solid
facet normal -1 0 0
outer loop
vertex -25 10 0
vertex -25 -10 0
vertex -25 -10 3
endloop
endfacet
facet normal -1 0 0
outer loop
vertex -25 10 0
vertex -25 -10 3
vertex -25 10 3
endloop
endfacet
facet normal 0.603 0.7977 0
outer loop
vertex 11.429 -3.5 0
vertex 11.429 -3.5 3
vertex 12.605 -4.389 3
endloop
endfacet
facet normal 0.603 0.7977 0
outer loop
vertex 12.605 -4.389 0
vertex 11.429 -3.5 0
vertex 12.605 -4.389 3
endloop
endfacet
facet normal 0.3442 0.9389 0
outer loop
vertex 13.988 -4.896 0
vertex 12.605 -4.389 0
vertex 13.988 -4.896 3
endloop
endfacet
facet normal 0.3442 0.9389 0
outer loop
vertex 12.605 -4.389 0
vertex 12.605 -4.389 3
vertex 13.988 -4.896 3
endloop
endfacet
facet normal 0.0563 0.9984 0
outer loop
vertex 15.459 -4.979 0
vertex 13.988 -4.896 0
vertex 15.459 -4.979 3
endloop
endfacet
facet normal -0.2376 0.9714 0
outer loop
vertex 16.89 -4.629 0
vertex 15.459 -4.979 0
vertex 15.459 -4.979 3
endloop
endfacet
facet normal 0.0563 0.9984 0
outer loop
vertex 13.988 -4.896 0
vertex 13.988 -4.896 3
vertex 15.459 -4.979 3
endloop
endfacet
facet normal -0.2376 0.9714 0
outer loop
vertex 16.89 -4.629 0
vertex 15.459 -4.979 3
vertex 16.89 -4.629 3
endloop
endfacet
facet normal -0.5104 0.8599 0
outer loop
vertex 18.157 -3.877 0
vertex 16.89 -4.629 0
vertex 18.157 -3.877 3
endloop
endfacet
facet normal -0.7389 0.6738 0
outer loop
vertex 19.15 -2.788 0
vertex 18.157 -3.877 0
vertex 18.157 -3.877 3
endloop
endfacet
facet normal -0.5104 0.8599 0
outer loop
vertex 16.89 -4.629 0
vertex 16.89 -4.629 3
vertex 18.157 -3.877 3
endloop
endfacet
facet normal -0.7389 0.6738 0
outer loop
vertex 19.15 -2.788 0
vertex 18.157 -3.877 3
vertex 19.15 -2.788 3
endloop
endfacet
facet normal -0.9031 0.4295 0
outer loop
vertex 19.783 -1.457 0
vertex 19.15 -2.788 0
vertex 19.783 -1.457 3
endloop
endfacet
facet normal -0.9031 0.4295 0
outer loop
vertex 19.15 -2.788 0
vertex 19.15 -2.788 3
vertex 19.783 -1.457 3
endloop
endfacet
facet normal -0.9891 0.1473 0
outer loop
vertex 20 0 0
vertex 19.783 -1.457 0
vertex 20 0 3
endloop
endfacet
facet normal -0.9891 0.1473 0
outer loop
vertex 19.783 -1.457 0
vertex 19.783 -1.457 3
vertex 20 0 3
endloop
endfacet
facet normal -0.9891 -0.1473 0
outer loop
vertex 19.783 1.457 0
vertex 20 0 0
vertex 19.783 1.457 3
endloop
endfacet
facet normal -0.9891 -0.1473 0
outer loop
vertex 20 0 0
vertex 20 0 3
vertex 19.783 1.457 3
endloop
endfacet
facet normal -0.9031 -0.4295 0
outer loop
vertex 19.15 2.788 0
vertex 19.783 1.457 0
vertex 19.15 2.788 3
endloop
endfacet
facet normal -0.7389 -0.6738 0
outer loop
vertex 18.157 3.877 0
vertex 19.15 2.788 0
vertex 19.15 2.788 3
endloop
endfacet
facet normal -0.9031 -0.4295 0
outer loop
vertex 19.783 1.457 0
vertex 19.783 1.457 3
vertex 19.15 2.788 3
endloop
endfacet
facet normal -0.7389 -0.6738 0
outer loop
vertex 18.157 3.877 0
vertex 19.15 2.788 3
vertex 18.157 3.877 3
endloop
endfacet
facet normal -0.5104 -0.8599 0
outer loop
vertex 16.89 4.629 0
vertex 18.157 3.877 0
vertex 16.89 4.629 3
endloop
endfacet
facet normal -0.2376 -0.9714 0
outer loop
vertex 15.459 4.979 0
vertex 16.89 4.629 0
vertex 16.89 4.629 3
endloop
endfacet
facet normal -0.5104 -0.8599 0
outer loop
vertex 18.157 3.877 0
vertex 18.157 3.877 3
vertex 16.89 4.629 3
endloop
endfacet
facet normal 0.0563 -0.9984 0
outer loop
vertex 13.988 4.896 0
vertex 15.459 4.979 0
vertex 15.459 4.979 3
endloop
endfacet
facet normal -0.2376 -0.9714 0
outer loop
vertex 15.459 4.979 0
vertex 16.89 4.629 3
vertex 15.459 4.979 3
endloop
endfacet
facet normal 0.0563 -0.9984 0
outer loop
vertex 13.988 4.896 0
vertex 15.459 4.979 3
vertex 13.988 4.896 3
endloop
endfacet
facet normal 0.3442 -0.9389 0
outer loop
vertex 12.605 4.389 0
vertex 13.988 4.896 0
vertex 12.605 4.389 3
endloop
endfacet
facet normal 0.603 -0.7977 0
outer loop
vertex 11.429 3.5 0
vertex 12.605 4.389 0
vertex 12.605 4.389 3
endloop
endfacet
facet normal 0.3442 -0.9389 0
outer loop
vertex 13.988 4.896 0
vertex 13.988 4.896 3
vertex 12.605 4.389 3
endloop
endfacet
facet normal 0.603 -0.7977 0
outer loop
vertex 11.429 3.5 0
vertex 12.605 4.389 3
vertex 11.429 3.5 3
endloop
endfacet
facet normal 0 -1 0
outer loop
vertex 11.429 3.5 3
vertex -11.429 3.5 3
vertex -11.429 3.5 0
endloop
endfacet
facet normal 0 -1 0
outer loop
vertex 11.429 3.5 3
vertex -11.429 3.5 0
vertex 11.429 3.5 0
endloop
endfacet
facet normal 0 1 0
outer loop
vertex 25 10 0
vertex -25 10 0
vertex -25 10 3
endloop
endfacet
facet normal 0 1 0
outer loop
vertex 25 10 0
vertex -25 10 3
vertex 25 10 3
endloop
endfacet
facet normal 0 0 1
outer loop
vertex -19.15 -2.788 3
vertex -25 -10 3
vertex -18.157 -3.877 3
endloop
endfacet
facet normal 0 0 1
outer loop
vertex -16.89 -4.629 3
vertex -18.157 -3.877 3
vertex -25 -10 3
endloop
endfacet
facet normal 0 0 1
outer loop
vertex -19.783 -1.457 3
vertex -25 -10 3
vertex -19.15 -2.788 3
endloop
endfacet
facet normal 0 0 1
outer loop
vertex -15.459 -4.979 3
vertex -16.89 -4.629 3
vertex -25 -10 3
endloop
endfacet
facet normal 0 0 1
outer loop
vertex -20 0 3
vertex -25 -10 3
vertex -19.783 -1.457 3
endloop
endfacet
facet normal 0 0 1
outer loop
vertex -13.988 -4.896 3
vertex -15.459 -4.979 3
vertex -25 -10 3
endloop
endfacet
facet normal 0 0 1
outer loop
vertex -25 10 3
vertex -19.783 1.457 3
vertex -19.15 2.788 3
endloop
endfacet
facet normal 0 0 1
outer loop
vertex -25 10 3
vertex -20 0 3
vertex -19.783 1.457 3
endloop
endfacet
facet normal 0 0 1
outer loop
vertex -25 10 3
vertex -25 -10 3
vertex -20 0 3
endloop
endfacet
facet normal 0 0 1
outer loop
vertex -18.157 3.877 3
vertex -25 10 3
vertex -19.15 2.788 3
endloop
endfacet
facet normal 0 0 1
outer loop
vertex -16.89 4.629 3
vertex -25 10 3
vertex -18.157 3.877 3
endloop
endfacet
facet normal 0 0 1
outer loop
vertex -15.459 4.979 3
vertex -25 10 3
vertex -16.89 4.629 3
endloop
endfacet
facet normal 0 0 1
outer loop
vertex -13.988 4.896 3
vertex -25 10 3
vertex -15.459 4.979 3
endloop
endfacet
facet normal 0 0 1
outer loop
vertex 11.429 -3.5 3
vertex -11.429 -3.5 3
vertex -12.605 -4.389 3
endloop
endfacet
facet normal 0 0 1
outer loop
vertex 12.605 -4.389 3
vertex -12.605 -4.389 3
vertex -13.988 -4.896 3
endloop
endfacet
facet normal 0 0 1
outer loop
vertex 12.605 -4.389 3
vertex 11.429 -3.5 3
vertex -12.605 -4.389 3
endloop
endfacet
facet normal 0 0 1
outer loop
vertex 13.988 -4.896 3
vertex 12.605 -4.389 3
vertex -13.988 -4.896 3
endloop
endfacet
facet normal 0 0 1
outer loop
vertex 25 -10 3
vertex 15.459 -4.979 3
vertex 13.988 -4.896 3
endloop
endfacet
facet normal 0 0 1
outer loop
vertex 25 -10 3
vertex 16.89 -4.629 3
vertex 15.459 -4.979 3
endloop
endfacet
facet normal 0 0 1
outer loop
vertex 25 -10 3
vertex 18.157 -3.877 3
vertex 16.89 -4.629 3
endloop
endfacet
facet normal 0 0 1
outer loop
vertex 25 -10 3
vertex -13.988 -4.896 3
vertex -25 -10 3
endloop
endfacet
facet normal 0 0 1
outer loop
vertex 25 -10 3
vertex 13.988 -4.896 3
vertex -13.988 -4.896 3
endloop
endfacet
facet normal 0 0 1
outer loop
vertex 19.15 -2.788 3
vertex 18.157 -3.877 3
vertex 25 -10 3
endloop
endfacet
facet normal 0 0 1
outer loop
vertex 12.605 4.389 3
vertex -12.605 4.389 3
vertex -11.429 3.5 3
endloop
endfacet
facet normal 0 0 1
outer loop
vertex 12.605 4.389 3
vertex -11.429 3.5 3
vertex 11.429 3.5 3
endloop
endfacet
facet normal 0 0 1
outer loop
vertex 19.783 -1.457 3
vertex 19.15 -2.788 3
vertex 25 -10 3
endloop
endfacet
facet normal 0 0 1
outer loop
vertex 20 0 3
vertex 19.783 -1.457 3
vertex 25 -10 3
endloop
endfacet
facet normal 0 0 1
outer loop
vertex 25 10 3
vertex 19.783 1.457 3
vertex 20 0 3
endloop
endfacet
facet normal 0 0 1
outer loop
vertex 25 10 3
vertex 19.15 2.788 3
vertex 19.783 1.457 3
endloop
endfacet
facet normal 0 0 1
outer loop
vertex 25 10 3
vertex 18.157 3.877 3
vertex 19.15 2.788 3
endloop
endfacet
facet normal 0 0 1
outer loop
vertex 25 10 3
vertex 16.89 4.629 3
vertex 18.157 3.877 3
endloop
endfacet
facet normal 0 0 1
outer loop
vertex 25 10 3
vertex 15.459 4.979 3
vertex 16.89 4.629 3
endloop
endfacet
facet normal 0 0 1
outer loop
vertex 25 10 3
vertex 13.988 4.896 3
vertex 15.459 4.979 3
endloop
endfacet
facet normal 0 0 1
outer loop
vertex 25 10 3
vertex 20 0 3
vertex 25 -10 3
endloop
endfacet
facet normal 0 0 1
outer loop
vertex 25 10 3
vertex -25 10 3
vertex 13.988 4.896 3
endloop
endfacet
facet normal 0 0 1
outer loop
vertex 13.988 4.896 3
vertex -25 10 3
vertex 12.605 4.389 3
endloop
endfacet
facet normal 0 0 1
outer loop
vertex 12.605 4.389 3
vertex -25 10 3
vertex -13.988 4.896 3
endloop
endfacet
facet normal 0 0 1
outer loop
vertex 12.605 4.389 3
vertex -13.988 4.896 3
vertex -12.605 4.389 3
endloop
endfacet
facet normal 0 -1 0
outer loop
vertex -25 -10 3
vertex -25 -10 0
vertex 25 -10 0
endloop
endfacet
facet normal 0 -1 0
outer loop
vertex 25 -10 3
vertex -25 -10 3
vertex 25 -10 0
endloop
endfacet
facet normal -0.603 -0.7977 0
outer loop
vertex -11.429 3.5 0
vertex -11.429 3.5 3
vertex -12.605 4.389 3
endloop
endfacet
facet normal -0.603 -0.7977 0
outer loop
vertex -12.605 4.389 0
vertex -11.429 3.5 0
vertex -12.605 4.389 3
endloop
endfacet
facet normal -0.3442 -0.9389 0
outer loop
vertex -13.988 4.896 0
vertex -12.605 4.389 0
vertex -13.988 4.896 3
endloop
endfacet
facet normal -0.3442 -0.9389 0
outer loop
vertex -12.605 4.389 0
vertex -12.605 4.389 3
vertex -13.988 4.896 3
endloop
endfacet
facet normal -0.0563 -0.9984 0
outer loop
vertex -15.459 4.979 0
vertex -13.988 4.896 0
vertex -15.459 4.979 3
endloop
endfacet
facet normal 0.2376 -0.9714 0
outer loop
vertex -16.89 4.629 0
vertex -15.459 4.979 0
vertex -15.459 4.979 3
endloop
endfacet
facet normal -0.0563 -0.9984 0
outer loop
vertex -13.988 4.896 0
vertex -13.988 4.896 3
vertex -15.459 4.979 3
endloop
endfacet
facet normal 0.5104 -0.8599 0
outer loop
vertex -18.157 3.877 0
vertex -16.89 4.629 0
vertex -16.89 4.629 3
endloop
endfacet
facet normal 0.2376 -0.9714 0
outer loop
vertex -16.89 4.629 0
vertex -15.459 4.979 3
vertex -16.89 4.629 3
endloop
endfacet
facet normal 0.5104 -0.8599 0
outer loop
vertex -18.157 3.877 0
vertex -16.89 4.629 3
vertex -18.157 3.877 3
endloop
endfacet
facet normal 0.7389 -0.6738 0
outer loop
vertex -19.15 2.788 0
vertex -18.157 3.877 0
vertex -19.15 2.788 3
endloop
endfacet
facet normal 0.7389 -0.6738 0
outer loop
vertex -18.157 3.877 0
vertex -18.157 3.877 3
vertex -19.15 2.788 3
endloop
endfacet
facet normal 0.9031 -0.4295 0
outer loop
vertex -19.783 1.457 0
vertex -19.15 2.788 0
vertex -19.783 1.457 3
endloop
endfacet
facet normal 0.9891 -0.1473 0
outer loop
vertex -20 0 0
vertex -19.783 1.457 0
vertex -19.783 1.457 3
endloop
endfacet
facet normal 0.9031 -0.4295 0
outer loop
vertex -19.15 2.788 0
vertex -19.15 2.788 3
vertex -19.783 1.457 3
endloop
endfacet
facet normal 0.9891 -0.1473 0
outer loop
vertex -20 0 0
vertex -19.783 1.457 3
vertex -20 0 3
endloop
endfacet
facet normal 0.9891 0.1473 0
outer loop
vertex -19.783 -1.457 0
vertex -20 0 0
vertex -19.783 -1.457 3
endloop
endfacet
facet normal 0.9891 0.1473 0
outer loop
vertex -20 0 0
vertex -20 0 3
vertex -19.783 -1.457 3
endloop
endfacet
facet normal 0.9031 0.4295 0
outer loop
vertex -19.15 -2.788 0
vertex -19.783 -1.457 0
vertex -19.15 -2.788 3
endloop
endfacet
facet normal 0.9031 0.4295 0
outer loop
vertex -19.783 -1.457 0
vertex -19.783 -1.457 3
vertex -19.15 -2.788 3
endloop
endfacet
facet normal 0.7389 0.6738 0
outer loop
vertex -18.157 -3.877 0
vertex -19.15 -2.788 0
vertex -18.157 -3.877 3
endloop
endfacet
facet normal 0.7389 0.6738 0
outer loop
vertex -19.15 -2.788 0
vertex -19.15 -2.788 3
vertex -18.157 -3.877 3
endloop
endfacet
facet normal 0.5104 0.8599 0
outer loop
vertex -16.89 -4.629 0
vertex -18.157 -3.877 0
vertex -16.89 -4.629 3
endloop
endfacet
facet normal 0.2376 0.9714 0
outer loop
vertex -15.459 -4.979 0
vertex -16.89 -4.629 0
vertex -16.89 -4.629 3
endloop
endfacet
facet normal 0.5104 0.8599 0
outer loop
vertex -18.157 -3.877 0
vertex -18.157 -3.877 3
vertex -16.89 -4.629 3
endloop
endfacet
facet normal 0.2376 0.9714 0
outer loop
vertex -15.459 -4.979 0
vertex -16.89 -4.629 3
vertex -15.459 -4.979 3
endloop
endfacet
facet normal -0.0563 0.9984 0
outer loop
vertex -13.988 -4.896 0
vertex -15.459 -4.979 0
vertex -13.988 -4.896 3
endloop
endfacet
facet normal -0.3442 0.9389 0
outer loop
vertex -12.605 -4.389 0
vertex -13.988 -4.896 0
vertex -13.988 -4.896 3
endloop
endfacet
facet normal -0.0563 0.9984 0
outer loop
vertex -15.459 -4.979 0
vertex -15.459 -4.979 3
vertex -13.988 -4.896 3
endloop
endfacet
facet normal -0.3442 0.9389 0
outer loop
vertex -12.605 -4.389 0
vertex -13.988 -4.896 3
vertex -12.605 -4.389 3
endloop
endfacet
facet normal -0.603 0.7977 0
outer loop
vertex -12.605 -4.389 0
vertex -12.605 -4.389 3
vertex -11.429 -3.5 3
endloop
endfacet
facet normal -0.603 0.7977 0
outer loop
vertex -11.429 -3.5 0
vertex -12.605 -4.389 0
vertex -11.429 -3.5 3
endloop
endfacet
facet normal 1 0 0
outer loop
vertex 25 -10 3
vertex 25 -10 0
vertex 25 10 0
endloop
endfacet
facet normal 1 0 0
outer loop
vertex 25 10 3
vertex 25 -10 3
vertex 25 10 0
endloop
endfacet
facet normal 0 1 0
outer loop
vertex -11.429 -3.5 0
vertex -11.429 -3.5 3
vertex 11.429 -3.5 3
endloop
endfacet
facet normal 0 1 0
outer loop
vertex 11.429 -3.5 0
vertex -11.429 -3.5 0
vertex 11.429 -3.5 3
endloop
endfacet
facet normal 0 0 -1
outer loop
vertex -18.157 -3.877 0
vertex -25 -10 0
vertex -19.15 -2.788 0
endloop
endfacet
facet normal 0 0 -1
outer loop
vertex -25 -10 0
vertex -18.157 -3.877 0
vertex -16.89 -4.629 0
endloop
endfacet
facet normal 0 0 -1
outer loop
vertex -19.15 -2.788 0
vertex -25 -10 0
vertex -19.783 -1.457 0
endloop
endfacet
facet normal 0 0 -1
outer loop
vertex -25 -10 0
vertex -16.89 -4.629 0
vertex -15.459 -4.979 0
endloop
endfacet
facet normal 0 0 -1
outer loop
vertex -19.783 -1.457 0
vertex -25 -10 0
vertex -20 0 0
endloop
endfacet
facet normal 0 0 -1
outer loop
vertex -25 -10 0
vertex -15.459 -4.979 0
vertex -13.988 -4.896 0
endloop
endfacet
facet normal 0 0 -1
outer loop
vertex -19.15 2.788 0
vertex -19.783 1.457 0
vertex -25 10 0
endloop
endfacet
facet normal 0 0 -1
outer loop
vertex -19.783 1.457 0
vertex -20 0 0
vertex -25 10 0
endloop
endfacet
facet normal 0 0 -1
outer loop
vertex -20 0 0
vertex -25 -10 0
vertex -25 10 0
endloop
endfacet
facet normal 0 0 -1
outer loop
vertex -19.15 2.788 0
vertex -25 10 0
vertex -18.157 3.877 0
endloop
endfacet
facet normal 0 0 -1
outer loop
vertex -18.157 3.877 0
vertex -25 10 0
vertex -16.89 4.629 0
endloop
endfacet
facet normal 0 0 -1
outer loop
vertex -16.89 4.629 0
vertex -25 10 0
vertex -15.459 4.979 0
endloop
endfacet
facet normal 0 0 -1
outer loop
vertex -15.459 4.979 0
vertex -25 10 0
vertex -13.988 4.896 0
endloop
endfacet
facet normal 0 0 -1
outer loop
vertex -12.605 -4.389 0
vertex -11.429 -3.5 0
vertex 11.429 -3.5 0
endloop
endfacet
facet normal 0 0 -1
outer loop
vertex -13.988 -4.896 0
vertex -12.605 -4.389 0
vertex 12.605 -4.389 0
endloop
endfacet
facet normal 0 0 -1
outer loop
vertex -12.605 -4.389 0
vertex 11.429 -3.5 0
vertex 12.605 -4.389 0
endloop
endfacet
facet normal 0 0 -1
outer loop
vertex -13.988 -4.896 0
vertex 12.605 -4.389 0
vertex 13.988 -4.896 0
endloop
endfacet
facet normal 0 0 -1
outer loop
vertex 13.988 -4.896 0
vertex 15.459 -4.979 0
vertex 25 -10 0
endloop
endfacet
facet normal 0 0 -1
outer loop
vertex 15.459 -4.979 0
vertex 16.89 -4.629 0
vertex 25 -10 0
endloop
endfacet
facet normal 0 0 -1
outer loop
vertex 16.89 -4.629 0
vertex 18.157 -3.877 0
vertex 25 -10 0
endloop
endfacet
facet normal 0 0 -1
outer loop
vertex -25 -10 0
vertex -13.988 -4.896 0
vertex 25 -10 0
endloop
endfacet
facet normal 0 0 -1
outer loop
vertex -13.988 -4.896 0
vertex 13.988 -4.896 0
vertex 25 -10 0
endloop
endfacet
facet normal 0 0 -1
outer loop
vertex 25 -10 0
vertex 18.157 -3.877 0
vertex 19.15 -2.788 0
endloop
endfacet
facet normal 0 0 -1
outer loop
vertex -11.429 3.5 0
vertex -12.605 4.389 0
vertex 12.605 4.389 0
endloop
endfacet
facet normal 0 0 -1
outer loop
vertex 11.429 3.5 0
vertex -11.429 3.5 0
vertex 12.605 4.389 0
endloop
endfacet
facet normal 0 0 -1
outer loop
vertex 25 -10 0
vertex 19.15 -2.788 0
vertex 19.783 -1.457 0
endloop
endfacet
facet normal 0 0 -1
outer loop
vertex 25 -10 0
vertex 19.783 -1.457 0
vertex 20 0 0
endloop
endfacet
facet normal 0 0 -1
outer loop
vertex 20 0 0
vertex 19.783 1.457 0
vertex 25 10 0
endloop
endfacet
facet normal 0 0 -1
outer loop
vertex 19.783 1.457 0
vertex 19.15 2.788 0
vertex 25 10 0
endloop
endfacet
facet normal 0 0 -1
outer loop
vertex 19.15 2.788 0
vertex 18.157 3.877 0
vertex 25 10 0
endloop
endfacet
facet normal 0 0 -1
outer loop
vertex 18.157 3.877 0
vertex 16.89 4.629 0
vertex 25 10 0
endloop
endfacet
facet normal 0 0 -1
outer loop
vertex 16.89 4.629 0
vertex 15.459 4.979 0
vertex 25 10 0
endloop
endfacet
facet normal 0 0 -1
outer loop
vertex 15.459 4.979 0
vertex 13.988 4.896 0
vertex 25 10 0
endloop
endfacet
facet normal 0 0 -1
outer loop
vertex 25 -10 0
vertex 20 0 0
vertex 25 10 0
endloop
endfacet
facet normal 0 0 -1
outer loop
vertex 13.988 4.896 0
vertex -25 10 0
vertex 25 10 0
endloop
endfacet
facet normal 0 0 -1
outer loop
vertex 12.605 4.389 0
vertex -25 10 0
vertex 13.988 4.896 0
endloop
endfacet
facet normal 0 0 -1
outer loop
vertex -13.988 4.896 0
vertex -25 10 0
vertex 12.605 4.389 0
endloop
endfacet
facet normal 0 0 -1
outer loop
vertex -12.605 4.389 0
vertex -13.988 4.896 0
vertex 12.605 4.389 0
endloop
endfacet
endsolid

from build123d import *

# Parameters (mm, degrees)
SKETCH_1_W          = 50
SKETCH_1_H          = 20
EXTRUDE_1_DEPTH     = 3
SKETCH_2_R          = 5
SKETCH_2_W          = 30
SKETCH_2_H          = 7
CUT_EXTRUDE_1_DEPTH = 3


with BuildPart() as part:
    # 스케치1 → 보스-돌출1 (new body)
    with BuildSketch(Plane.XY):
        Rectangle(SKETCH_1_W, SKETCH_1_H)
    extrude(amount=EXTRUDE_1_DEPTH)

    # 스케치2 → 컷-돌출1 (cut)
    with BuildSketch(Plane.XY.offset(3)):
        with Locations((-15, 0)):
            Circle(SKETCH_2_R)
        with Locations((15, 0)):
            Circle(SKETCH_2_R)
        Rectangle(SKETCH_2_W, SKETCH_2_H)
    extrude(amount=-CUT_EXTRUDE_1_DEPTH, mode=Mode.SUBTRACT)


solid = part.part
